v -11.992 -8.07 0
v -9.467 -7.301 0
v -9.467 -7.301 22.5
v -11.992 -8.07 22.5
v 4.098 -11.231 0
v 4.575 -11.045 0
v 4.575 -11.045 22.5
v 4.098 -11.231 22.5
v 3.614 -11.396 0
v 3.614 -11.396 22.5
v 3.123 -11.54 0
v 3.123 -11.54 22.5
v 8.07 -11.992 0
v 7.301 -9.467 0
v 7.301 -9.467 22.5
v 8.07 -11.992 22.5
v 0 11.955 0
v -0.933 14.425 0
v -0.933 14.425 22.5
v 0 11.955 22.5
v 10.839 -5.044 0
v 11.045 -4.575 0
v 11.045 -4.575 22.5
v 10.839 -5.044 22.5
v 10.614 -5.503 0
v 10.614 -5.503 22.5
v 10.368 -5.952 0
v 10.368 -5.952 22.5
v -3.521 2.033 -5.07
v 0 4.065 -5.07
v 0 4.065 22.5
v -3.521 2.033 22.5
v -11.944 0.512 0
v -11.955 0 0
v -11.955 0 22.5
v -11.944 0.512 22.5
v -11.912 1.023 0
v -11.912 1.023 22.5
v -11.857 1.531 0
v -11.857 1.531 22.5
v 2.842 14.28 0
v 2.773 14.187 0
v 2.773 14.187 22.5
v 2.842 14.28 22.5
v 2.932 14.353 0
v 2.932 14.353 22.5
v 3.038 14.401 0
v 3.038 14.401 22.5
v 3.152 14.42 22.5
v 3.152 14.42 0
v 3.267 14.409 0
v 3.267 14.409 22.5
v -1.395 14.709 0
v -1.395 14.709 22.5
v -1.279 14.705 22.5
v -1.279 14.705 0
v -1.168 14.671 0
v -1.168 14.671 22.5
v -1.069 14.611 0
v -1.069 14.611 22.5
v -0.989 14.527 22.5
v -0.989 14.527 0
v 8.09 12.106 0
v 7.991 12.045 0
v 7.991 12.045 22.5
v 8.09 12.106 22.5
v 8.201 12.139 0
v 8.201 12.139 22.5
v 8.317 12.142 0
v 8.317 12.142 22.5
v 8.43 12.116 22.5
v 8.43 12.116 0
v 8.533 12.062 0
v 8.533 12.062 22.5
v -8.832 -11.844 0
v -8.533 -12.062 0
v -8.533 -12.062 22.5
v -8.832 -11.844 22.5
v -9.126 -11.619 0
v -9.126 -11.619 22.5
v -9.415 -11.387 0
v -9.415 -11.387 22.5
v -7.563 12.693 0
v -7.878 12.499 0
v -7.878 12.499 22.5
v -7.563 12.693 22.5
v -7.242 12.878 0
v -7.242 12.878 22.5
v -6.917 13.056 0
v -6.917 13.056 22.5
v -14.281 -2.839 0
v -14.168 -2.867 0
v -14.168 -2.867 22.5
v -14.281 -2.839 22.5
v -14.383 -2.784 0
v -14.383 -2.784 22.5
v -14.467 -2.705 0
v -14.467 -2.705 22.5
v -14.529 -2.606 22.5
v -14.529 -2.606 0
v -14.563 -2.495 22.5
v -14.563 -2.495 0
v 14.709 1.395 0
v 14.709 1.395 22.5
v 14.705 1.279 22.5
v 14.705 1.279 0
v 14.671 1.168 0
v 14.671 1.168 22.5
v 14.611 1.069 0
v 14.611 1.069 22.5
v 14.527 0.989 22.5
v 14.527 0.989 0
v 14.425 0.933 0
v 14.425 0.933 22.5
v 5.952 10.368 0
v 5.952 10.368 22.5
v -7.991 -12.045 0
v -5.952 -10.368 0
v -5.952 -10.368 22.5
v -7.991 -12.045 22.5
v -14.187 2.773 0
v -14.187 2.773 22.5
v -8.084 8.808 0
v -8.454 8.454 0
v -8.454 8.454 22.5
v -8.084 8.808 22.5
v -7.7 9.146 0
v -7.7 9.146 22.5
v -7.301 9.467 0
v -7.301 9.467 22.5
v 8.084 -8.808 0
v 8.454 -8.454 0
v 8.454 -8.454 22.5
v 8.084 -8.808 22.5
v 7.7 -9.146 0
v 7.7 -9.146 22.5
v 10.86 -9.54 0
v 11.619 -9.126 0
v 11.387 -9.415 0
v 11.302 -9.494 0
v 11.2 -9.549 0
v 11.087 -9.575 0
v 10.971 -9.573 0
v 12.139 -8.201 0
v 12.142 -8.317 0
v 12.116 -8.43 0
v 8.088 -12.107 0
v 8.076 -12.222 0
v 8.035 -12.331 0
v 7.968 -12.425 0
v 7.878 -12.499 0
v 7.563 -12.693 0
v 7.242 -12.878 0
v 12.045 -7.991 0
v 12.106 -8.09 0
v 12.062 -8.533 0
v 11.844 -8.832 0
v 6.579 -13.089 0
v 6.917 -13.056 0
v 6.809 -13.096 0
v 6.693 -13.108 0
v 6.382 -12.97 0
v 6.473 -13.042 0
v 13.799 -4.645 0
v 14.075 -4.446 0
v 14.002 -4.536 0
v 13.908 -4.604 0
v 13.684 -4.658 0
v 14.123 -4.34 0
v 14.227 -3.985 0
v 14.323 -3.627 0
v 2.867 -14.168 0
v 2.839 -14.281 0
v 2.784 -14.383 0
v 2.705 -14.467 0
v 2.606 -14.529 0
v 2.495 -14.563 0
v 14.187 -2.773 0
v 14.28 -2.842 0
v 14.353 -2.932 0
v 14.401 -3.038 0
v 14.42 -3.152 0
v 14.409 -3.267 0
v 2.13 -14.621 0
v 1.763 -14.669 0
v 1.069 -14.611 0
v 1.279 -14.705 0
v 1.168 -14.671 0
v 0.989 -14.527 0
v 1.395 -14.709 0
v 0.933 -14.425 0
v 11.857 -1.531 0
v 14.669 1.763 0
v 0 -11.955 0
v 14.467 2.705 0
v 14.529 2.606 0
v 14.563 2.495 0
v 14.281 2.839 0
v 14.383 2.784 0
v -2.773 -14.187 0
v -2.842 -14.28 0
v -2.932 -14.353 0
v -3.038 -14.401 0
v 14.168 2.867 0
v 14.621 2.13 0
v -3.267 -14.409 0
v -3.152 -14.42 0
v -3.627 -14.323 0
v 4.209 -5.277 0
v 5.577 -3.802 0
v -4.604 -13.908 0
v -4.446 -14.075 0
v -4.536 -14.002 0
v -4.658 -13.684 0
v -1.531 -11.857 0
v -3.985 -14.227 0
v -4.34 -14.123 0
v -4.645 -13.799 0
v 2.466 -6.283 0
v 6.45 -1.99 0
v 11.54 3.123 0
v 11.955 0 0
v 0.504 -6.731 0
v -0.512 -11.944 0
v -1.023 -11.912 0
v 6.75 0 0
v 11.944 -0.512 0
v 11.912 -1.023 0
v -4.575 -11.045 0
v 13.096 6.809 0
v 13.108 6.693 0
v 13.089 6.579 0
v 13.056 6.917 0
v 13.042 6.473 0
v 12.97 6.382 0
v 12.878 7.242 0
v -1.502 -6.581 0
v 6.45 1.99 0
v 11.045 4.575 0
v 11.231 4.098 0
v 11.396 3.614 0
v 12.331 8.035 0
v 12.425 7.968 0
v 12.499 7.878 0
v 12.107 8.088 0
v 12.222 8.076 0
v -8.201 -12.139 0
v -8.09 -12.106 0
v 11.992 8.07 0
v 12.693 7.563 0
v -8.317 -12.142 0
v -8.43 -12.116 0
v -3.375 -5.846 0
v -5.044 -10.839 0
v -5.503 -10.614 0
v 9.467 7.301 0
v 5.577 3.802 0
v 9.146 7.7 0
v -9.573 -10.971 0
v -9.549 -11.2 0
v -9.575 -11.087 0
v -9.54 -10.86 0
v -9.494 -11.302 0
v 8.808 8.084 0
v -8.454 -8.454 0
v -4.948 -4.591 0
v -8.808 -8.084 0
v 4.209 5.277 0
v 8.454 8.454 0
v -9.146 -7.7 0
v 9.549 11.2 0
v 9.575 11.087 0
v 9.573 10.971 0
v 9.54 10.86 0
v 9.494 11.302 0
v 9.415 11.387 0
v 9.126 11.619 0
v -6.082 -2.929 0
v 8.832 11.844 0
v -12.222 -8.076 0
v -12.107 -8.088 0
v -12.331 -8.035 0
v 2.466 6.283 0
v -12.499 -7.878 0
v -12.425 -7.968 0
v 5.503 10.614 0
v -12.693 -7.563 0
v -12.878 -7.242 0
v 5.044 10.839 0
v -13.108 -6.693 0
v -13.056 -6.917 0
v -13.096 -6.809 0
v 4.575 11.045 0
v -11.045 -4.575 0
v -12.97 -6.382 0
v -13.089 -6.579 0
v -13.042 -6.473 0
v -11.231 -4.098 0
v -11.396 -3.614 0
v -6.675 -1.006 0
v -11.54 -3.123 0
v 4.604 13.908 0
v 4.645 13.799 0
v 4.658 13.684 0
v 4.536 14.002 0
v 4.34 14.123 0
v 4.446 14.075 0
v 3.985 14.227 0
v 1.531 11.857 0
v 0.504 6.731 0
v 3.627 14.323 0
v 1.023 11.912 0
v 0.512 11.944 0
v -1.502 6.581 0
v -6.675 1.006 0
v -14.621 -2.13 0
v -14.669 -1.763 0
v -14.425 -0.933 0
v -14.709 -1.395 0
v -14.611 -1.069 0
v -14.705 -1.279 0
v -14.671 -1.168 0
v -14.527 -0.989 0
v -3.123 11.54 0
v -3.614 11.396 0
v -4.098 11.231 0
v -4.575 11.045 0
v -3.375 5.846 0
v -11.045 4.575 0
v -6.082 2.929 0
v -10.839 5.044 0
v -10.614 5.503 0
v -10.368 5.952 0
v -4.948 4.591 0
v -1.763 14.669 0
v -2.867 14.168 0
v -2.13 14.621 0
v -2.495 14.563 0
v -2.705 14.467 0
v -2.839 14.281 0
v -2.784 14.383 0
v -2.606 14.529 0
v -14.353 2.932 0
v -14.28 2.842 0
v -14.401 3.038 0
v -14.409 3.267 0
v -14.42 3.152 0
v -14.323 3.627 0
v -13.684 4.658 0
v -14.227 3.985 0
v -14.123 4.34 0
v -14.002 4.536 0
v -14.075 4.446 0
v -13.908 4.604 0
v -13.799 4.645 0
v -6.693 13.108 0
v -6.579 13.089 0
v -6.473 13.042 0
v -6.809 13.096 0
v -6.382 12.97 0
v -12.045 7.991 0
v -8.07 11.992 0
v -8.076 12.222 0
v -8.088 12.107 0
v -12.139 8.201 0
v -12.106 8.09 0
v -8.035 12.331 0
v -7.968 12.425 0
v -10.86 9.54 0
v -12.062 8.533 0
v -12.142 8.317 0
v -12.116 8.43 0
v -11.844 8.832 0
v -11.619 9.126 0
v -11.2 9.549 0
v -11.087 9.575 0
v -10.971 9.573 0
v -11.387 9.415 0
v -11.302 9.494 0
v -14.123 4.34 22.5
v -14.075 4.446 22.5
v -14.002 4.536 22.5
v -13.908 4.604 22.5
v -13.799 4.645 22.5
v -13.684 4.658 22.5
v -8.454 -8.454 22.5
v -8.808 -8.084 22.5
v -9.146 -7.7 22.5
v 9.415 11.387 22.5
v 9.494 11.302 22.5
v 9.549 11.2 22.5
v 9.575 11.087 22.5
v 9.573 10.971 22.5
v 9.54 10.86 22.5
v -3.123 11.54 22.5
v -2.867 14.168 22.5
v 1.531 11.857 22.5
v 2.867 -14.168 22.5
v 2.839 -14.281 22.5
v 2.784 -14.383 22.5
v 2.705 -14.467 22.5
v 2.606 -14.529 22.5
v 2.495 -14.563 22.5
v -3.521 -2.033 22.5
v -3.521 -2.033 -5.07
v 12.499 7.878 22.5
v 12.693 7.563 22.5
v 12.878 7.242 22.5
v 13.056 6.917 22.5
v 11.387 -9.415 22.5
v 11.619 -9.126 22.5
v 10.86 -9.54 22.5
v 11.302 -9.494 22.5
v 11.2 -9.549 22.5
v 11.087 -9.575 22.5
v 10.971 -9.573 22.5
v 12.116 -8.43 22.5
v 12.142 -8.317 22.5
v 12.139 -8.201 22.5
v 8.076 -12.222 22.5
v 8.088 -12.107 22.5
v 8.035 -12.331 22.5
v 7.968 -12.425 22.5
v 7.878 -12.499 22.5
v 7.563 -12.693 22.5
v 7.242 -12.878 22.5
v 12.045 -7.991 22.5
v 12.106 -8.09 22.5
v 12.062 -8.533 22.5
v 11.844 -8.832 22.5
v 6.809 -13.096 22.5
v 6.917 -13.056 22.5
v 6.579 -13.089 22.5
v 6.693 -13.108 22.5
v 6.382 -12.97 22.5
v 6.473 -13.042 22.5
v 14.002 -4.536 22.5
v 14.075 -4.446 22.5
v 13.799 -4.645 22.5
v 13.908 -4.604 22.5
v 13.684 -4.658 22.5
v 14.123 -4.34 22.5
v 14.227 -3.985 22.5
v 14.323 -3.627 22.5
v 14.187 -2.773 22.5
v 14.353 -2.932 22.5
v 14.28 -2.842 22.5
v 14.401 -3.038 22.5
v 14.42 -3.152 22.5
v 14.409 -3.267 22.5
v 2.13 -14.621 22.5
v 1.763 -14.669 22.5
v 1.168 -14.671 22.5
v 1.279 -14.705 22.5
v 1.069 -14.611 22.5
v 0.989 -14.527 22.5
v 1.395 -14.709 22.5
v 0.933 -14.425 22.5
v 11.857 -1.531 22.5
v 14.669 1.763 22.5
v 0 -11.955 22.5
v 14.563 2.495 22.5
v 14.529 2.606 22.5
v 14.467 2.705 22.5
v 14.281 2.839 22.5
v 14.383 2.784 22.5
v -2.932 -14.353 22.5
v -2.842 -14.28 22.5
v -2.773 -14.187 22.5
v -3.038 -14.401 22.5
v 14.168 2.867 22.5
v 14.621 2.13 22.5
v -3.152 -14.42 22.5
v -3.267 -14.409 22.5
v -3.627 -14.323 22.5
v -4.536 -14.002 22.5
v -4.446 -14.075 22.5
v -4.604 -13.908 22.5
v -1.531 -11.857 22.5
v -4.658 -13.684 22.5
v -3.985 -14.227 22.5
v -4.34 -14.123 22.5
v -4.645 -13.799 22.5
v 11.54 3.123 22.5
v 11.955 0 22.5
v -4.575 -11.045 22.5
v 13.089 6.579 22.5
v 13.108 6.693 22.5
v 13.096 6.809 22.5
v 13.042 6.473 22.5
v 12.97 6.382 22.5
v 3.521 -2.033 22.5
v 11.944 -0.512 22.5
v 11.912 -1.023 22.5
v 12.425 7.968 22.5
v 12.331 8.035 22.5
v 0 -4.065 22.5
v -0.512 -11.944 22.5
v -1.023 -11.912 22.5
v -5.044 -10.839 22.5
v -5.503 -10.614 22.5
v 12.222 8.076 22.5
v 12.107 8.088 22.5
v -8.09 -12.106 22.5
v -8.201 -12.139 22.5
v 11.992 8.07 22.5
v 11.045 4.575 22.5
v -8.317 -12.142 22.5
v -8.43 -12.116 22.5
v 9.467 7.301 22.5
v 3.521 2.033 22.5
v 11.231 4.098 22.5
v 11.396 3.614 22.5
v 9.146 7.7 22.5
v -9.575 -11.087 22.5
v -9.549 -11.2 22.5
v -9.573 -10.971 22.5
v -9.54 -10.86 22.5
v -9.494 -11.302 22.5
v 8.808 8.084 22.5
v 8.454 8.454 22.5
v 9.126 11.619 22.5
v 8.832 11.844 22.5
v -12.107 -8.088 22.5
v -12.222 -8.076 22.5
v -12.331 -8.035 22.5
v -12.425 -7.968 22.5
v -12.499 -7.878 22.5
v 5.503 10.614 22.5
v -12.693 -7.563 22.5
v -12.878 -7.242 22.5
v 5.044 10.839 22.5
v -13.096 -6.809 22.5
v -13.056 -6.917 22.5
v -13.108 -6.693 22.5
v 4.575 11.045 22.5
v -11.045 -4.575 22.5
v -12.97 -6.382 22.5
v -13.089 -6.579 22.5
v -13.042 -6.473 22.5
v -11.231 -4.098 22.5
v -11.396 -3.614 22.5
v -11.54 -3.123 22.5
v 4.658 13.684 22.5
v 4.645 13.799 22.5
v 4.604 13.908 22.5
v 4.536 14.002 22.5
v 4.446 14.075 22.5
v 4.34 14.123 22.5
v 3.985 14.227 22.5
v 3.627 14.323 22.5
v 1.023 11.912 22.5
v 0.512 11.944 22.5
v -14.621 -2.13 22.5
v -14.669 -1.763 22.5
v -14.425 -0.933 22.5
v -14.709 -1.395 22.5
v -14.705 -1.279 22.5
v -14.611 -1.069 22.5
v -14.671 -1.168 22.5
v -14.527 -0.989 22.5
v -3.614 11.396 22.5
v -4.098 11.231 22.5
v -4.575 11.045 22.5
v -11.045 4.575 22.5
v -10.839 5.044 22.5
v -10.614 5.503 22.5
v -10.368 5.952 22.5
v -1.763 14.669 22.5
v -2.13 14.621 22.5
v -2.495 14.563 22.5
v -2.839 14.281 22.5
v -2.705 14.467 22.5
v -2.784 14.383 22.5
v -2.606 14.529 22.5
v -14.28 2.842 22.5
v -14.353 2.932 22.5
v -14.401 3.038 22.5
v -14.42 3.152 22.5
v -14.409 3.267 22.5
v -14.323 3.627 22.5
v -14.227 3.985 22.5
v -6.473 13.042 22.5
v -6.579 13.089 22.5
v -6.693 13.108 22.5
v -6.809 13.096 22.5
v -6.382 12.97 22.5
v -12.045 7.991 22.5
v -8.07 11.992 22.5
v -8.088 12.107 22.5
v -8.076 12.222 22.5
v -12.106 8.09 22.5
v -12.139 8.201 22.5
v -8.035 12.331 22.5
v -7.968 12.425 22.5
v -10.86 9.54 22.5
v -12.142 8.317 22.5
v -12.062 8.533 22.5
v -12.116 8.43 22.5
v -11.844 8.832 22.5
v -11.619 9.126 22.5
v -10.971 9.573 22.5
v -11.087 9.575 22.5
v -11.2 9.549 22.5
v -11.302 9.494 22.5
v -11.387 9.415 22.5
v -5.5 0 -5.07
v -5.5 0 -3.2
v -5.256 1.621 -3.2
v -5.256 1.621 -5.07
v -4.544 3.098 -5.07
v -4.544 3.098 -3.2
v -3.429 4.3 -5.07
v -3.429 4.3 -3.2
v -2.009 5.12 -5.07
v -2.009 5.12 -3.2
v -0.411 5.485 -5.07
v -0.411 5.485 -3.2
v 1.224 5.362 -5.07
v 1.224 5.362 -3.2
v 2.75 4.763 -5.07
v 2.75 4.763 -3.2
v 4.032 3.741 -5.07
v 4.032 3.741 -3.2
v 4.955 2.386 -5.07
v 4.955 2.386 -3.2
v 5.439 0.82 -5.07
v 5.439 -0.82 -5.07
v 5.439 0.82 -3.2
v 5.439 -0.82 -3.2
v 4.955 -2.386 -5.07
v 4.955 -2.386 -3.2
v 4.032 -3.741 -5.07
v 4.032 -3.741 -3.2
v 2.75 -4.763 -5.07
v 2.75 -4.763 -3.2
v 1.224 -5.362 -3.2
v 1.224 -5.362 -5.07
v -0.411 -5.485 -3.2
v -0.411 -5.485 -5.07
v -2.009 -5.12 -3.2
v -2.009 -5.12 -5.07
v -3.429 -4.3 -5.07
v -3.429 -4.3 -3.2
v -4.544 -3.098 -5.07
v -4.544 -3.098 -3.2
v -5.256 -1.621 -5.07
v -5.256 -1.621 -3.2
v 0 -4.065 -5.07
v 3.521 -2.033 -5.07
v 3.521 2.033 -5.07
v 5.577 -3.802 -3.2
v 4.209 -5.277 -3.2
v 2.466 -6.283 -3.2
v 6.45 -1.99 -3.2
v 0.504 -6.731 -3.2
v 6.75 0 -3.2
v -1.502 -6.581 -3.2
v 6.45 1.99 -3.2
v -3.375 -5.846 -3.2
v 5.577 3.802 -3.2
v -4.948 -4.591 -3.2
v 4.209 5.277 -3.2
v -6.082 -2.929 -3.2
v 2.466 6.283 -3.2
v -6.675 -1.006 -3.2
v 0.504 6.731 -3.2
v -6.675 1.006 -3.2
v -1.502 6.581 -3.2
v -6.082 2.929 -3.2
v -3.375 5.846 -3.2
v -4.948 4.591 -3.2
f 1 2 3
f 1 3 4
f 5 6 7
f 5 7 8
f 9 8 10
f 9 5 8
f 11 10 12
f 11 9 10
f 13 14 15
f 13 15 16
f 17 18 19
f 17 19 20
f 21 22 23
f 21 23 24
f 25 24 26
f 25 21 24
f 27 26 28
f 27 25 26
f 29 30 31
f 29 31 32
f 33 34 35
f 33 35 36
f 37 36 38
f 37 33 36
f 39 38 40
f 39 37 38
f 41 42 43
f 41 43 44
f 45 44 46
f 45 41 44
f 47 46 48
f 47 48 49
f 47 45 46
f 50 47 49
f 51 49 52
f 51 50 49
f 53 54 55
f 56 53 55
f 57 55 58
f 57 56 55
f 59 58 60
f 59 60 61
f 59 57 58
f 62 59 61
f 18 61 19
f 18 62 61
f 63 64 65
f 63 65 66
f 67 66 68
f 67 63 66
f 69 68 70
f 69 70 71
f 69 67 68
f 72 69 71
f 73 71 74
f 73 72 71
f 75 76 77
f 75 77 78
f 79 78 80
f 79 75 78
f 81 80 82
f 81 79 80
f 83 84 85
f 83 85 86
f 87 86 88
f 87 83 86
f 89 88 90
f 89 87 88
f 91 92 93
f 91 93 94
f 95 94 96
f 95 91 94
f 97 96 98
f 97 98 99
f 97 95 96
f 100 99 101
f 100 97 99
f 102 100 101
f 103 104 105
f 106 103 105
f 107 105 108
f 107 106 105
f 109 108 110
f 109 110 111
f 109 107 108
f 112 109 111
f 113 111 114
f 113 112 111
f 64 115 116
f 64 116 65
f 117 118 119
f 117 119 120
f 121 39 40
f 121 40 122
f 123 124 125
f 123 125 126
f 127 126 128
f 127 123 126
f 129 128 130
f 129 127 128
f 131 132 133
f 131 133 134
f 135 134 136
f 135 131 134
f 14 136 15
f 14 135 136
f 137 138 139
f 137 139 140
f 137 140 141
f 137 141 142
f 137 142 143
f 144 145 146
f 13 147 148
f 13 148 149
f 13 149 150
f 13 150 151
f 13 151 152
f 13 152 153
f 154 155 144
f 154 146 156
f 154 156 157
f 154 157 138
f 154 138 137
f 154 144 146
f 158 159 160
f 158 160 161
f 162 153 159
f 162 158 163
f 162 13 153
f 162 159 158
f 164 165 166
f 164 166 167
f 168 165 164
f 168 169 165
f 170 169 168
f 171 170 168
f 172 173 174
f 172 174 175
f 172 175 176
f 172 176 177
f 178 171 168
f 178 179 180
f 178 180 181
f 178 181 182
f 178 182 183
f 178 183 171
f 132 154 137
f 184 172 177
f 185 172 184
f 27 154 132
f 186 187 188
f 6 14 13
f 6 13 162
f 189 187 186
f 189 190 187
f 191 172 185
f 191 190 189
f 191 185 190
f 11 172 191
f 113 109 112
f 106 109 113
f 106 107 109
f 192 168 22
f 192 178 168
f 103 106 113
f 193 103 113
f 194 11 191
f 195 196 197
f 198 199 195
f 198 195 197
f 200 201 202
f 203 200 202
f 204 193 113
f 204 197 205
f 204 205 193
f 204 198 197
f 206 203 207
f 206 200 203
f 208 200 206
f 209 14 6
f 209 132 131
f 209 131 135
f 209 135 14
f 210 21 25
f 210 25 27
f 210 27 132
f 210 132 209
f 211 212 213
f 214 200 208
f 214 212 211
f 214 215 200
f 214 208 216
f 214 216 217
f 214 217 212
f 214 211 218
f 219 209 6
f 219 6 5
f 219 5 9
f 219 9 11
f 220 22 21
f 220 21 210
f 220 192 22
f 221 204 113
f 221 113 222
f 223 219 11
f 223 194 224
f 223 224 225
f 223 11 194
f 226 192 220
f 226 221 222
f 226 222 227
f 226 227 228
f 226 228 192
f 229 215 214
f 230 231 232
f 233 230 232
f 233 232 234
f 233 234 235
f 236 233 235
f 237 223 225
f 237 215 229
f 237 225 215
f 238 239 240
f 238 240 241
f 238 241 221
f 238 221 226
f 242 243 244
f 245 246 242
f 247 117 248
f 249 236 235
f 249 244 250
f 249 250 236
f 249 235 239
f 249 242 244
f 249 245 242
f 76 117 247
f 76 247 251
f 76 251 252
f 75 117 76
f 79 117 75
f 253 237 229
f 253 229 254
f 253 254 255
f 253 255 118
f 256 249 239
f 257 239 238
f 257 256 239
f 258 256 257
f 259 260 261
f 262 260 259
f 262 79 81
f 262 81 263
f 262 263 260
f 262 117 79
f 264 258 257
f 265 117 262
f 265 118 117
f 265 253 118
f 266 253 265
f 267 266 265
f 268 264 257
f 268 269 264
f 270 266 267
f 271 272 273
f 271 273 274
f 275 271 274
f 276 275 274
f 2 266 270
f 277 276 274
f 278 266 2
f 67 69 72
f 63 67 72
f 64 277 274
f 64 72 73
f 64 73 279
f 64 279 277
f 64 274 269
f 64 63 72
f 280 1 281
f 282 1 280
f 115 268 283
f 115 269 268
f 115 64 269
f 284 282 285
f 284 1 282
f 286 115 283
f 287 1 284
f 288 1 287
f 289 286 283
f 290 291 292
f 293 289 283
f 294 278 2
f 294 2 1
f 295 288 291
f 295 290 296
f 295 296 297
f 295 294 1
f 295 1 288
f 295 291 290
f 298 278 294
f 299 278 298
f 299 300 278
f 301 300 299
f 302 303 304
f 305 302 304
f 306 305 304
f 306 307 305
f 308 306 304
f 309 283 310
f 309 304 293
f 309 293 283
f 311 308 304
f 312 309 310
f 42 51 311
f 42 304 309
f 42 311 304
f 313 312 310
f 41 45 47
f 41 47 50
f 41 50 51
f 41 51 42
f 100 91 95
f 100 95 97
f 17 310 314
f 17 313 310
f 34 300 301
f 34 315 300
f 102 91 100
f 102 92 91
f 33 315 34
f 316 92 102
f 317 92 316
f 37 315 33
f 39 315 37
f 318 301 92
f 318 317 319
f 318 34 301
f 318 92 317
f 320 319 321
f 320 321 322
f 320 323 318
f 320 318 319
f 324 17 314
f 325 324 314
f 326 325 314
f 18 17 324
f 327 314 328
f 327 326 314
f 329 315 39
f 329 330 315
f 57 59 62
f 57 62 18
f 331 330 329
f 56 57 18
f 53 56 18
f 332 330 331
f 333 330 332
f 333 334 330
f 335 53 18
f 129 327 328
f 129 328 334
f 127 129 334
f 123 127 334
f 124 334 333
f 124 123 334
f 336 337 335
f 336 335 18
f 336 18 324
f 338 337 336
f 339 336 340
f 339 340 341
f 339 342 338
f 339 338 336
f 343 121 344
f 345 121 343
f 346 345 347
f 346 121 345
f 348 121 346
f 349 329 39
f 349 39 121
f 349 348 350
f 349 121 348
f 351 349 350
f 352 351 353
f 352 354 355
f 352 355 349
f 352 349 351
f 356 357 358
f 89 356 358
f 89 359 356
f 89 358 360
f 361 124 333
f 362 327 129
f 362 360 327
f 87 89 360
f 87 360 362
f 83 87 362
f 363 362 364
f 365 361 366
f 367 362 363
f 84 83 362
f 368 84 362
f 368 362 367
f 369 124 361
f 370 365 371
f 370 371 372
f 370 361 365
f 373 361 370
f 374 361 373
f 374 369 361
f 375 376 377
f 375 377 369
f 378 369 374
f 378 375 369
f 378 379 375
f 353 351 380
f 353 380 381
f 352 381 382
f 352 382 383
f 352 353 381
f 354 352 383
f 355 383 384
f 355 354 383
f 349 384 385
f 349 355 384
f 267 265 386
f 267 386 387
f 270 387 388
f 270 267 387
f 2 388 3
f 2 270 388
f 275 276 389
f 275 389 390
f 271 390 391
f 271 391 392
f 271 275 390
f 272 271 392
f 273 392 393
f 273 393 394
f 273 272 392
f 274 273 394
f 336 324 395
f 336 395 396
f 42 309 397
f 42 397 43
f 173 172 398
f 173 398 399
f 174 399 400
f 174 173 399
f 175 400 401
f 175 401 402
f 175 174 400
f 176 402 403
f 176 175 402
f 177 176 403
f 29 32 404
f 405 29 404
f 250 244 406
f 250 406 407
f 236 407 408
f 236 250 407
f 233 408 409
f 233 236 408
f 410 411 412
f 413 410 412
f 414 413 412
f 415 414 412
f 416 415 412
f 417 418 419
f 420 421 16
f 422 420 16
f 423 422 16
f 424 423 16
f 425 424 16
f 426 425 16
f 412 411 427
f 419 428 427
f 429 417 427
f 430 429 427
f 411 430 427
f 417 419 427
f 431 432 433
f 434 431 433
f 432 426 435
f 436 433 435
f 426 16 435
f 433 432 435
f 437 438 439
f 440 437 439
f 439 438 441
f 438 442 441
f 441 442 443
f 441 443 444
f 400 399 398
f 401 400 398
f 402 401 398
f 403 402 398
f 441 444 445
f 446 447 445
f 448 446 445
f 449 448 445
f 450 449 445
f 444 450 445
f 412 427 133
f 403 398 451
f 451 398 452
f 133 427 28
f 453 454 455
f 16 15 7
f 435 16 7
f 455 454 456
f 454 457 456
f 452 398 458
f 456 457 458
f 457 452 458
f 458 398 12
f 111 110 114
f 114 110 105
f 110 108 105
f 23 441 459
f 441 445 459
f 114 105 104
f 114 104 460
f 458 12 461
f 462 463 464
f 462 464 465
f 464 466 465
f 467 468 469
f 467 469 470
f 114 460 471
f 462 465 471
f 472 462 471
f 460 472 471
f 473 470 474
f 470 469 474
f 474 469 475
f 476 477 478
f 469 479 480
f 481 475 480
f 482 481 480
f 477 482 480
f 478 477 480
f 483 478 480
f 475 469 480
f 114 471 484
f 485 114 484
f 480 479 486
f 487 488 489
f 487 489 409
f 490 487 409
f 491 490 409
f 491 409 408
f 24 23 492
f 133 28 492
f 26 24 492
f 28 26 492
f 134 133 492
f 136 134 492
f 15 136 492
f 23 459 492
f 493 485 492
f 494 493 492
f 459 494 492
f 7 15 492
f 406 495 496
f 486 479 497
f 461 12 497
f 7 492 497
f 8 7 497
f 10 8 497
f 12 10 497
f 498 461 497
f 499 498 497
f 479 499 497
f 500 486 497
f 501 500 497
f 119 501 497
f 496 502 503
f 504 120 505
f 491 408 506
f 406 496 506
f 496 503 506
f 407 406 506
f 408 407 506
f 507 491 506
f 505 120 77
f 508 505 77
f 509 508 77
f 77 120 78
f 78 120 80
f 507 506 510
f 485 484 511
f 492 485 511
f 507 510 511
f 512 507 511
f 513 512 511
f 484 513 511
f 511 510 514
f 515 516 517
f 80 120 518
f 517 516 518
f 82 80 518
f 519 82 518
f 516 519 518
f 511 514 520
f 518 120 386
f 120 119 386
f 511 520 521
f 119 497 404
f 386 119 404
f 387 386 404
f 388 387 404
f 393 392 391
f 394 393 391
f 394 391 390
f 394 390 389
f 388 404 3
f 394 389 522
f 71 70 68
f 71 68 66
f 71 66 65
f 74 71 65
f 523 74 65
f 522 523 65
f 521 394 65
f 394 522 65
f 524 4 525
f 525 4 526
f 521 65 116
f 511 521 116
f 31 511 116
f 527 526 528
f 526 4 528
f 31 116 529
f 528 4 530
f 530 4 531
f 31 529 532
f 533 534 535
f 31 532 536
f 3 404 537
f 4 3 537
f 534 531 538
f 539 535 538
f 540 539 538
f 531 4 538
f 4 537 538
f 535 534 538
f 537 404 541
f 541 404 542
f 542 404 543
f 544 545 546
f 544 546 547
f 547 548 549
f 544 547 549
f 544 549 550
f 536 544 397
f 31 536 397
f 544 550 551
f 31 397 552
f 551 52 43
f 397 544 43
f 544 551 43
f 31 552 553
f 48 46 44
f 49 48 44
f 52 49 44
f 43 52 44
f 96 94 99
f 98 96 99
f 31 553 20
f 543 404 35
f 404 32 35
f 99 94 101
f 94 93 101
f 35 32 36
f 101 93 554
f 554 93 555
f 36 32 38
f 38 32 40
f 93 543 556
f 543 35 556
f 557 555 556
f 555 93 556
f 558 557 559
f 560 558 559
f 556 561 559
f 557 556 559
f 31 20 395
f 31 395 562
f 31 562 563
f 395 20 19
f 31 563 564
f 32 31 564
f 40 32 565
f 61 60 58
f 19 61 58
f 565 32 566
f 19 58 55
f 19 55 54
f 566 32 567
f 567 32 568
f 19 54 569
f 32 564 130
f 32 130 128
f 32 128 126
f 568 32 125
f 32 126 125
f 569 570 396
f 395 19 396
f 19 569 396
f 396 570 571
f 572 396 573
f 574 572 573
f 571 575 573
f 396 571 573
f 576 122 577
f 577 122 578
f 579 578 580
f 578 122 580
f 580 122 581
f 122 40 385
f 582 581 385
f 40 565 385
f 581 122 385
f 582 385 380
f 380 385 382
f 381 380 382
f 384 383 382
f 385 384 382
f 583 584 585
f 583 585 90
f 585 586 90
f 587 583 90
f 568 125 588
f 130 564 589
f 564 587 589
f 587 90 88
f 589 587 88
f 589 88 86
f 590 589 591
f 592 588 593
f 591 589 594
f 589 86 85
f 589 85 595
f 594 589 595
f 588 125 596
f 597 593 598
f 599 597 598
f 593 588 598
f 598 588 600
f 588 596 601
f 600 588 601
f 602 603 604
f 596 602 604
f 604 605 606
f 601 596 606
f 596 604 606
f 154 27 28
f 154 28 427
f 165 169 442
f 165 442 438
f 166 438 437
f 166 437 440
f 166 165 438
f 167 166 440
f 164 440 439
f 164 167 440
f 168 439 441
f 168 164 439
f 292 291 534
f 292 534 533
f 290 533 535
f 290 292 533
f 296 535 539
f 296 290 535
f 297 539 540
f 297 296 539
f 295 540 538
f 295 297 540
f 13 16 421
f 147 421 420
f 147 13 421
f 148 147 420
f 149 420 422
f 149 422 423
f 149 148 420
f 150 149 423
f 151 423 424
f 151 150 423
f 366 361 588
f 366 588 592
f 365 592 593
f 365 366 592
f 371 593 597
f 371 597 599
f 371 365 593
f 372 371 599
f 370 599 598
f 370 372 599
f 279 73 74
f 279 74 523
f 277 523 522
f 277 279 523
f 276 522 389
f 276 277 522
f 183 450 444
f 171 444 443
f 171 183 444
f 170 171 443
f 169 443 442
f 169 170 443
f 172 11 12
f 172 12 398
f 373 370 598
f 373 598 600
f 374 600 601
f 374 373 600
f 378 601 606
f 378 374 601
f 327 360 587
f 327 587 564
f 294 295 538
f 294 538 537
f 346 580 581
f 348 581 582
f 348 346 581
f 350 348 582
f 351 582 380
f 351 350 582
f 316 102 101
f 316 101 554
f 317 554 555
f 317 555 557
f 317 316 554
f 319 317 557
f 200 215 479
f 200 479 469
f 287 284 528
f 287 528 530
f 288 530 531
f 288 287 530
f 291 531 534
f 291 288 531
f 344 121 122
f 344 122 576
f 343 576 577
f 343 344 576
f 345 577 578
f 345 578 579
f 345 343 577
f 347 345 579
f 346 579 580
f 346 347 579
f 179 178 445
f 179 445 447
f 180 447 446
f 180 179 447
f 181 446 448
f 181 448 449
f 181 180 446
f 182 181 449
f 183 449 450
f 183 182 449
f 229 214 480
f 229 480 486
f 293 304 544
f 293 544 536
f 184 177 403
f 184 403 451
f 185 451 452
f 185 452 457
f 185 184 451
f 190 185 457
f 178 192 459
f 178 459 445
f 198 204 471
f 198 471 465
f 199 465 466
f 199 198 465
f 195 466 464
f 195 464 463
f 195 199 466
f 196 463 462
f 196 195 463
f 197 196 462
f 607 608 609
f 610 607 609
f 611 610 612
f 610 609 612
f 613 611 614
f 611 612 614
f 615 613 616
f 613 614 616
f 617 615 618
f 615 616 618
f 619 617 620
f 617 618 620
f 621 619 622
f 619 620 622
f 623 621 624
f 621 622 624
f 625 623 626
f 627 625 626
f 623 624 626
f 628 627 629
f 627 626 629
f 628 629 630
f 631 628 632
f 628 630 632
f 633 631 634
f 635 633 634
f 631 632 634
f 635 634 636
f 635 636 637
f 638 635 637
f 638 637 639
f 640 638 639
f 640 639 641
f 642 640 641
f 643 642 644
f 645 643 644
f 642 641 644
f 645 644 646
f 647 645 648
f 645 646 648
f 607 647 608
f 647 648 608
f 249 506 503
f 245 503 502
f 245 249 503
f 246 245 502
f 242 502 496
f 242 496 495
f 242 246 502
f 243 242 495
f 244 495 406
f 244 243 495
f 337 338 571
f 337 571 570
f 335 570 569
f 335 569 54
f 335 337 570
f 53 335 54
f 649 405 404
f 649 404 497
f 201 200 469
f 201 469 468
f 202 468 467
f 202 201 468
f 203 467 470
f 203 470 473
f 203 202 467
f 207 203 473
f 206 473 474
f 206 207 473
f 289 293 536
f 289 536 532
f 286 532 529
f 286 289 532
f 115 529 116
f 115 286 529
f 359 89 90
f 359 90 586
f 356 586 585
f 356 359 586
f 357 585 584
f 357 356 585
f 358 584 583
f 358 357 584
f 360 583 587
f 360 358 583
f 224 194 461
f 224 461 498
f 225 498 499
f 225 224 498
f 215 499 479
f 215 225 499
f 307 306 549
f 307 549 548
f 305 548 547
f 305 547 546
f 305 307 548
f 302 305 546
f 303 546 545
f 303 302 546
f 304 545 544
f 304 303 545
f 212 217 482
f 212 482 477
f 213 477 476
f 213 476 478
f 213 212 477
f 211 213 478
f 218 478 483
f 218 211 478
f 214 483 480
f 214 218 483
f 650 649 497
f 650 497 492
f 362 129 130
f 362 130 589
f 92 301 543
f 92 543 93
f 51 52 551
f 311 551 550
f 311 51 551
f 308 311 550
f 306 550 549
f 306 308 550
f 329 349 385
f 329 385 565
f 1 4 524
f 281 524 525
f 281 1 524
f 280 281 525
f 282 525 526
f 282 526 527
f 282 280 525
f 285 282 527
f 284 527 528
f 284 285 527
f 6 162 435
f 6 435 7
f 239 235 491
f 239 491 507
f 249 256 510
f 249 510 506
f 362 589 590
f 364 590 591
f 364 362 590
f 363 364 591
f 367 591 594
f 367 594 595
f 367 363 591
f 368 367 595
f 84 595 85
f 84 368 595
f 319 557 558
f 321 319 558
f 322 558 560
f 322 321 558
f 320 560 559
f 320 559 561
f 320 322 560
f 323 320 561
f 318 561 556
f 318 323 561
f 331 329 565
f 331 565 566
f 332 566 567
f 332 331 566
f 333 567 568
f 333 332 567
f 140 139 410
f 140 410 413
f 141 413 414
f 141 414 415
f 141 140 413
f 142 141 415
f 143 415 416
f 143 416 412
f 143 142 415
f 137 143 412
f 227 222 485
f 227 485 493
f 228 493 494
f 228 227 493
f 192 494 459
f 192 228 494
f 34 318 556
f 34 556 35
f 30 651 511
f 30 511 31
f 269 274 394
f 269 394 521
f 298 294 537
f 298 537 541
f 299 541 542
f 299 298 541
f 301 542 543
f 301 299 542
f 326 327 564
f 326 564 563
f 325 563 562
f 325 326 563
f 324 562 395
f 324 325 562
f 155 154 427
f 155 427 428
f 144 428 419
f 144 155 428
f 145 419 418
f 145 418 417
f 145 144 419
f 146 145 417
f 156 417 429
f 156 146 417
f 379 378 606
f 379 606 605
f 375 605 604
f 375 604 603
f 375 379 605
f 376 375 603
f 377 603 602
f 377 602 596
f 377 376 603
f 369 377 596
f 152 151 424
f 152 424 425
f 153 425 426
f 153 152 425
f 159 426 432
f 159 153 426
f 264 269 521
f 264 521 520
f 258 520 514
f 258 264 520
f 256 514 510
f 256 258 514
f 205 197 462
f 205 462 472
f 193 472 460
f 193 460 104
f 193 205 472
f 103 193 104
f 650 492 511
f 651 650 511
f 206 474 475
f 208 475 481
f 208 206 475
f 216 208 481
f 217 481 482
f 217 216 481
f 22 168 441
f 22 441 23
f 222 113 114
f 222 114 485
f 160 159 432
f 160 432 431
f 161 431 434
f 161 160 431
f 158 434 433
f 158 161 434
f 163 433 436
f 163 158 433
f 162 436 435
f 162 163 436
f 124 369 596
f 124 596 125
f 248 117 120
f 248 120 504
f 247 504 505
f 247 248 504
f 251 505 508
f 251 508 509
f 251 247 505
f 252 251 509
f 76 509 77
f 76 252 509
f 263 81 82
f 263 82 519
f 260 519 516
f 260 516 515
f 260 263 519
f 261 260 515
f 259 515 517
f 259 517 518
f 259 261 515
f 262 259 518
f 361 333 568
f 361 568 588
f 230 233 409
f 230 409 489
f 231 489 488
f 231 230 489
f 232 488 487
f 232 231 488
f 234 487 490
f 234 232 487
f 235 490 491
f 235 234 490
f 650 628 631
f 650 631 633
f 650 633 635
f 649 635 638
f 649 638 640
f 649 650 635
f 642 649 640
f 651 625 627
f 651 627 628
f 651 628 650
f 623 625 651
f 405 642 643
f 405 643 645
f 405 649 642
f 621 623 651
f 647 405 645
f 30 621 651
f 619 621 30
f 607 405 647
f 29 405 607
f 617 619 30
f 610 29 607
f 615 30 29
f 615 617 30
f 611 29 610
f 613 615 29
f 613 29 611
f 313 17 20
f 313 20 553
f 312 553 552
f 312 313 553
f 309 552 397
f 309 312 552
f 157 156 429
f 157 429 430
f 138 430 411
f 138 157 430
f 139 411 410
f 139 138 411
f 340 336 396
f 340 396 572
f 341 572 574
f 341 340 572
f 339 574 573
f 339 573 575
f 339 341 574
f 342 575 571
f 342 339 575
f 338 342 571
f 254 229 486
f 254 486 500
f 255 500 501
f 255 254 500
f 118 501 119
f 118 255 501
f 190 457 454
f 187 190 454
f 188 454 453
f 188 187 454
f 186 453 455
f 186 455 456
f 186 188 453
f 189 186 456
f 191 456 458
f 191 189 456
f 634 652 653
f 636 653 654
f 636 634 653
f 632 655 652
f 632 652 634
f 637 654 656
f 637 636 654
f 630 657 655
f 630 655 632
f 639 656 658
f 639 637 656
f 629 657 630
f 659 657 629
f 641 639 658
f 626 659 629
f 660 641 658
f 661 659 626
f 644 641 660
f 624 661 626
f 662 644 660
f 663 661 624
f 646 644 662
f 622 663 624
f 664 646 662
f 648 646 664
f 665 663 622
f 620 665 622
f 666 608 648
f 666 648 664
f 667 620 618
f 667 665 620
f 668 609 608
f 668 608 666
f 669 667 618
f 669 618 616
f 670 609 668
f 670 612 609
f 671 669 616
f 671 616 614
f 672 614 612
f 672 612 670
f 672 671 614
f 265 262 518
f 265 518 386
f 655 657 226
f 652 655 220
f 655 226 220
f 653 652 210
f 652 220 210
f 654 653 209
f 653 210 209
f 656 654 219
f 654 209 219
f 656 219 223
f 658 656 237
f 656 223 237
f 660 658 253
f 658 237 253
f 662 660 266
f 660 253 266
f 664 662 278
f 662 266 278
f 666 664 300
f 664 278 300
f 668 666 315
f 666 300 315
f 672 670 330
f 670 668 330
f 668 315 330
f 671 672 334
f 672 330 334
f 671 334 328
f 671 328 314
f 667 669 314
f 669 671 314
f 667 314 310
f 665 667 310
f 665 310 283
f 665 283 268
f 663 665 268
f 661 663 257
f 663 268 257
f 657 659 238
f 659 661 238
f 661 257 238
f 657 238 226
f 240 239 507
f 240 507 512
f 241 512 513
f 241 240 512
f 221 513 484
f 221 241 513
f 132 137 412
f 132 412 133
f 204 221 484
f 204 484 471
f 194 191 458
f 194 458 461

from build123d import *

# Parameters (mm, degrees)
SALIENTE_EXTRUIR1_DEPTH    = 15
CROQUIS5_R                 = 4.5
SALIENTE_EXTRUIR2_DEPTH    = 6
ESCALA1_SCALE              = 1.5
CORTAR_EXTRUIR3_DEPTH      = 38.7502155
CORTAR_EXTRUIR3_DEPTH_BACK = 5.8
CROQUIS7_R                 = 10
CROQUIS8_R                 = 5.5
SALIENTE_EXTRUIR3_DEPTH    = 1.87
CORTAR_EXTRUIR4_DEPTH      = 35.538871873
CORTAR_EXTRUIR4_DEPTH_BACK = 35.538871873


with BuildPart() as part:
    # Croquis2 → Saliente-Extruir1 (new body)
    with BuildSketch(Plane.XY):
        with BuildLine():
            Line((-2.081696937, 7.693567449), (-1.911179214, 9.445287663))
            ThreePointArc((-1.911179214, 9.445287663), (-1.831468139, 9.618345927), (-1.663611198, 9.708496165))
            ThreePointArc((-1.663611198, 9.708496165), (-1.297642615, 9.764149919), (-0.929841298, 9.806013214))
            ThreePointArc((-0.929841298, 9.806013214), (-0.744265019, 9.762833784), (-0.622120698, 9.616601835))
            Line((-0.622120698, 9.616601835), (0, 7.97022222))
            ThreePointArc((0, 7.97022222), (0.511536449, 7.953789832), (1.020963606, 7.904560428))
            Line((1.020963606, 7.904560428), (1.848855744, 9.457684572))
            ThreePointArc((1.848855744, 9.457684572), (1.988725705, 9.587065453), (2.1783043, 9.606117341))
            ThreePointArc((2.1783043, 9.606117341), (2.537712953, 9.517484592), (2.893537451, 9.415409764))
            ThreePointArc((2.893537451, 9.415409764), (3.048463524, 9.304500205), (3.105349619, 9.122656892))
            Line((3.105349619, 9.122656892), (3.050071996, 7.363525179))
            ThreePointArc((3.050071996, 7.363525179), (3.516381649, 7.152587108), (3.968191694, 6.912155736))
            Line((3.968191694, 6.912155736), (5.327419174, 8.030234739))
            ThreePointArc((5.327419174, 8.030234739), (5.506154088, 8.09624117), (5.688592714, 8.041294232))
            ThreePointArc((5.688592714, 8.041294232), (5.986724728, 7.821868513), (6.276401353, 7.591395527))
            ThreePointArc((6.276401353, 7.591395527), (6.37709113, 7.429640815), (6.360058606, 7.239870134))
            Line((6.360058606, 7.239870134), (5.635798179, 5.635798179))
            ThreePointArc((5.635798179, 5.635798179), (5.985889619, 5.262467835), (6.311298569, 4.867437992))
            Line((6.311298569, 4.867437992), (7.994931329, 5.380254461))
            ThreePointArc((7.994931329, 5.380254461), (8.185320425, 5.372837562), (8.332844455, 5.252256971))
            ThreePointArc((8.332844455, 5.252256971), (8.524311933, 4.935443857), (8.703740045, 4.611660138))
            ThreePointArc((8.703740045, 4.611660138), (8.73486442, 4.42368596), (8.646506324, 4.254878777))
            Line((8.646506324, 4.254878777), (7.363525179, 3.050071996))
            ThreePointArc((7.363525179, 3.050071996), (7.544100156, 2.571185538), (7.693567449, 2.081696937))
            Line((7.693567449, 2.081696937), (9.445287663, 1.911179214))
            ThreePointArc((9.445287663, 1.911179214), (9.618345927, 1.831468139), (9.708496165, 1.663611198))
            ThreePointArc((9.708496165, 1.663611198), (9.764149919, 1.297642615), (9.806013214, 0.929841298))
            ThreePointArc((9.806013214, 0.929841298), (9.762833784, 0.744265019), (9.616601835, 0.622120698))
            Line((9.616601835, 0.622120698), (7.97022222, 0))
            ThreePointArc((7.97022222, 0), (7.953789832, -0.511536449), (7.904560428, -1.020963606))
            Line((7.904560428, -1.020963606), (9.457684572, -1.848855744))
            ThreePointArc((9.457684572, -1.848855744), (9.587065453, -1.988725705), (9.606117341, -2.1783043))
            ThreePointArc((9.606117341, -2.1783043), (9.517484592, -2.537712953), (9.415409764, -2.893537451))
            ThreePointArc((9.415409764, -2.893537451), (9.304500205, -3.048463524), (9.122656892, -3.105349619))
            Line((9.122656892, -3.105349619), (7.363525179, -3.050071996))
            ThreePointArc((7.363525179, -3.050071996), (7.152587108, -3.516381649), (6.912155736, -3.968191694))
            Line((6.912155736, -3.968191694), (8.030234739, -5.327419174))
            ThreePointArc((8.030234739, -5.327419174), (8.09624117, -5.506154088), (8.041294232, -5.688592714))
            ThreePointArc((8.041294232, -5.688592714), (7.821868513, -5.986724728), (7.591395527, -6.276401353))
            ThreePointArc((7.591395527, -6.276401353), (7.429640815, -6.37709113), (7.239870134, -6.360058606))
            Line((7.239870134, -6.360058606), (5.635798179, -5.635798179))
            ThreePointArc((5.635798179, -5.635798179), (5.262467835, -5.985889619), (4.867437992, -6.311298569))
            Line((4.867437992, -6.311298569), (5.380254461, -7.994931329))
            ThreePointArc((5.380254461, -7.994931329), (5.372837562, -8.185320425), (5.252256971, -8.332844455))
            ThreePointArc((5.252256971, -8.332844455), (4.935443857, -8.524311933), (4.611660138, -8.703740045))
            ThreePointArc((4.611660138, -8.703740045), (4.42368596, -8.73486442), (4.254878777, -8.646506324))
            Line((4.254878777, -8.646506324), (3.050071996, -7.363525179))
            ThreePointArc((3.050071996, -7.363525179), (2.571185538, -7.544100156), (2.081696937, -7.693567449))
            Line((2.081696937, -7.693567449), (1.911179214, -9.445287663))
            ThreePointArc((1.911179214, -9.445287663), (1.831468139, -9.618345927), (1.663611198, -9.708496165))
            ThreePointArc((1.663611198, -9.708496165), (1.297642615, -9.764149919), (0.929841298, -9.806013214))
            ThreePointArc((0.929841298, -9.806013214), (0.744265019, -9.762833784), (0.622120698, -9.616601835))
            Line((0.622120698, -9.616601835), (0, -7.97022222))
            ThreePointArc((0, -7.97022222), (-0.511536449, -7.953789832), (-1.020963606, -7.904560428))
            Line((-1.020963606, -7.904560428), (-1.848855744, -9.457684572))
            ThreePointArc((-1.848855744, -9.457684572), (-1.988725705, -9.587065453), (-2.1783043, -9.606117341))
            ThreePointArc((-2.1783043, -9.606117341), (-2.537712953, -9.517484592), (-2.893537451, -9.415409764))
            ThreePointArc((-2.893537451, -9.415409764), (-3.048463524, -9.304500205), (-3.105349619, -9.122656892))
            Line((-3.105349619, -9.122656892), (-3.050071996, -7.363525179))
            ThreePointArc((-3.050071996, -7.363525179), (-3.516381649, -7.152587108), (-3.968191694, -6.912155736))
            Line((-3.968191694, -6.912155736), (-5.327419174, -8.030234739))
            ThreePointArc((-5.327419174, -8.030234739), (-5.506154088, -8.09624117), (-5.688592714, -8.041294232))
            ThreePointArc((-5.688592714, -8.041294232), (-5.986724728, -7.821868513), (-6.276401353, -7.591395527))
            ThreePointArc((-6.276401353, -7.591395527), (-6.37709113, -7.429640815), (-6.360058606, -7.239870134))
            Line((-6.360058606, -7.239870134), (-5.635798179, -5.635798179))
            ThreePointArc((-5.635798179, -5.635798179), (-5.985889619, -5.262467835), (-6.311298569, -4.867437992))
            Line((-6.311298569, -4.867437992), (-7.994931329, -5.380254461))
            ThreePointArc((-7.994931329, -5.380254461), (-8.185320425, -5.372837562), (-8.332844455, -5.252256971))
            ThreePointArc((-8.332844455, -5.252256971), (-8.524311933, -4.935443857), (-8.703740045, -4.611660138))
            ThreePointArc((-8.703740045, -4.611660138), (-8.73486442, -4.42368596), (-8.646506324, -4.254878777))
            Line((-8.646506324, -4.254878777), (-7.363525179, -3.050071996))
            ThreePointArc((-7.363525179, -3.050071996), (-7.544100156, -2.571185538), (-7.693567449, -2.081696937))
            Line((-7.693567449, -2.081696937), (-9.445287663, -1.911179214))
            ThreePointArc((-9.445287663, -1.911179214), (-9.618345927, -1.831468139), (-9.708496165, -1.663611198))
            ThreePointArc((-9.708496165, -1.663611198), (-9.764149919, -1.297642615), (-9.806013214, -0.929841298))
            ThreePointArc((-9.806013214, -0.929841298), (-9.762833784, -0.744265019), (-9.616601835, -0.622120698))
            Line((-9.616601835, -0.622120698), (-7.97022222, 0))
            ThreePointArc((-7.97022222, 0), (-7.953789832, 0.511536449), (-7.904560428, 1.020963606))
            Line((-7.904560428, 1.020963606), (-9.457684572, 1.848855744))
            ThreePointArc((-9.457684572, 1.848855744), (-9.587065453, 1.988725705), (-9.606117341, 2.1783043))
            ThreePointArc((-9.606117341, 2.1783043), (-9.517484592, 2.537712953), (-9.415409764, 2.893537451))
            ThreePointArc((-9.415409764, 2.893537451), (-9.304500205, 3.048463524), (-9.122656892, 3.105349619))
            Line((-9.122656892, 3.105349619), (-7.363525179, 3.050071996))
            ThreePointArc((-7.363525179, 3.050071996), (-7.152587108, 3.516381649), (-6.912155736, 3.968191694))
            Line((-6.912155736, 3.968191694), (-8.030234739, 5.327419174))
            ThreePointArc((-8.030234739, 5.327419174), (-8.09624117, 5.506154088), (-8.041294232, 5.688592714))
            ThreePointArc((-8.041294232, 5.688592714), (-7.821868513, 5.986724728), (-7.591395527, 6.276401353))
            ThreePointArc((-7.591395527, 6.276401353), (-7.429640815, 6.37709113), (-7.239870134, 6.360058606))
            Line((-7.239870134, 6.360058606), (-5.635798179, 5.635798179))
            ThreePointArc((-5.635798179, 5.635798179), (-5.262467835, 5.985889619), (-4.867437992, 6.311298569))
            Line((-4.867437992, 6.311298569), (-5.380254461, 7.994931329))
            ThreePointArc((-5.380254461, 7.994931329), (-5.372837562, 8.185320425), (-5.252256971, 8.332844455))
            ThreePointArc((-5.252256971, 8.332844455), (-4.935443857, 8.524311933), (-4.611660138, 8.703740045))
            ThreePointArc((-4.611660138, 8.703740045), (-4.42368596, 8.73486442), (-4.254878777, 8.646506324))
            Line((-4.254878777, 8.646506324), (-3.050071996, 7.363525179))
            ThreePointArc((-3.050071996, 7.363525179), (-2.571185538, 7.544100156), (-2.081696937, 7.693567449))
        make_face()
    extrude(amount=SALIENTE_EXTRUIR1_DEPTH)

    # Croquis5 → Saliente-Extruir2 (add)
    with BuildSketch(Plane(origin=(0, 0, 0), x_dir=(-1, 0, 0), z_dir=(0, 0, -1))):
        with Locations(Location((0, 0, 0), (0, 0, 180))):
            Circle(CROQUIS5_R)
    extrude(amount=SALIENTE_EXTRUIR2_DEPTH)


with BuildPart() as part_1:
    # Escala1: scaled about (0, 0, 0)
    add(part.part.scale(ESCALA1_SCALE))

    # Croquis7 → Cortar-Extruir3 (cut, two sides: drawn at the far end of the back side and taken through both)
    with BuildSketch(Plane(origin=(0, 0, -9), x_dir=(-1, 0, 0), z_dir=(0, 0, -1)).offset(-CORTAR_EXTRUIR3_DEPTH_BACK)):
        Circle(CROQUIS7_R)
    extrude(amount=CORTAR_EXTRUIR3_DEPTH + CORTAR_EXTRUIR3_DEPTH_BACK, mode=Mode.SUBTRACT)

    # Croquis8 → Saliente-Extruir3 (add)
    with BuildSketch(Plane(origin=(0, 0, -3.2), x_dir=(-1, 0, 0), z_dir=(0, 0, -1))):
        Circle(CROQUIS8_R)
    extrude(amount=SALIENTE_EXTRUIR3_DEPTH)

    # Croquis10 → Cortar-Extruir4 (cut, two sides: drawn at the far end of the back side and taken through both)
    with BuildSketch(Plane.XY.offset(22.5).offset(-CORTAR_EXTRUIR4_DEPTH_BACK)):
        Polygon((0, 4.065470054), (-3.520800345, 2.032735027), (-3.520800345, -2.032735027), (0, -4.065470054), (3.520800345, -2.032735027), (3.520800345, 2.032735027), align=None)
    extrude(amount=CORTAR_EXTRUIR4_DEPTH + CORTAR_EXTRUIR4_DEPTH_BACK, mode=Mode.SUBTRACT)


solid = part_1.part
